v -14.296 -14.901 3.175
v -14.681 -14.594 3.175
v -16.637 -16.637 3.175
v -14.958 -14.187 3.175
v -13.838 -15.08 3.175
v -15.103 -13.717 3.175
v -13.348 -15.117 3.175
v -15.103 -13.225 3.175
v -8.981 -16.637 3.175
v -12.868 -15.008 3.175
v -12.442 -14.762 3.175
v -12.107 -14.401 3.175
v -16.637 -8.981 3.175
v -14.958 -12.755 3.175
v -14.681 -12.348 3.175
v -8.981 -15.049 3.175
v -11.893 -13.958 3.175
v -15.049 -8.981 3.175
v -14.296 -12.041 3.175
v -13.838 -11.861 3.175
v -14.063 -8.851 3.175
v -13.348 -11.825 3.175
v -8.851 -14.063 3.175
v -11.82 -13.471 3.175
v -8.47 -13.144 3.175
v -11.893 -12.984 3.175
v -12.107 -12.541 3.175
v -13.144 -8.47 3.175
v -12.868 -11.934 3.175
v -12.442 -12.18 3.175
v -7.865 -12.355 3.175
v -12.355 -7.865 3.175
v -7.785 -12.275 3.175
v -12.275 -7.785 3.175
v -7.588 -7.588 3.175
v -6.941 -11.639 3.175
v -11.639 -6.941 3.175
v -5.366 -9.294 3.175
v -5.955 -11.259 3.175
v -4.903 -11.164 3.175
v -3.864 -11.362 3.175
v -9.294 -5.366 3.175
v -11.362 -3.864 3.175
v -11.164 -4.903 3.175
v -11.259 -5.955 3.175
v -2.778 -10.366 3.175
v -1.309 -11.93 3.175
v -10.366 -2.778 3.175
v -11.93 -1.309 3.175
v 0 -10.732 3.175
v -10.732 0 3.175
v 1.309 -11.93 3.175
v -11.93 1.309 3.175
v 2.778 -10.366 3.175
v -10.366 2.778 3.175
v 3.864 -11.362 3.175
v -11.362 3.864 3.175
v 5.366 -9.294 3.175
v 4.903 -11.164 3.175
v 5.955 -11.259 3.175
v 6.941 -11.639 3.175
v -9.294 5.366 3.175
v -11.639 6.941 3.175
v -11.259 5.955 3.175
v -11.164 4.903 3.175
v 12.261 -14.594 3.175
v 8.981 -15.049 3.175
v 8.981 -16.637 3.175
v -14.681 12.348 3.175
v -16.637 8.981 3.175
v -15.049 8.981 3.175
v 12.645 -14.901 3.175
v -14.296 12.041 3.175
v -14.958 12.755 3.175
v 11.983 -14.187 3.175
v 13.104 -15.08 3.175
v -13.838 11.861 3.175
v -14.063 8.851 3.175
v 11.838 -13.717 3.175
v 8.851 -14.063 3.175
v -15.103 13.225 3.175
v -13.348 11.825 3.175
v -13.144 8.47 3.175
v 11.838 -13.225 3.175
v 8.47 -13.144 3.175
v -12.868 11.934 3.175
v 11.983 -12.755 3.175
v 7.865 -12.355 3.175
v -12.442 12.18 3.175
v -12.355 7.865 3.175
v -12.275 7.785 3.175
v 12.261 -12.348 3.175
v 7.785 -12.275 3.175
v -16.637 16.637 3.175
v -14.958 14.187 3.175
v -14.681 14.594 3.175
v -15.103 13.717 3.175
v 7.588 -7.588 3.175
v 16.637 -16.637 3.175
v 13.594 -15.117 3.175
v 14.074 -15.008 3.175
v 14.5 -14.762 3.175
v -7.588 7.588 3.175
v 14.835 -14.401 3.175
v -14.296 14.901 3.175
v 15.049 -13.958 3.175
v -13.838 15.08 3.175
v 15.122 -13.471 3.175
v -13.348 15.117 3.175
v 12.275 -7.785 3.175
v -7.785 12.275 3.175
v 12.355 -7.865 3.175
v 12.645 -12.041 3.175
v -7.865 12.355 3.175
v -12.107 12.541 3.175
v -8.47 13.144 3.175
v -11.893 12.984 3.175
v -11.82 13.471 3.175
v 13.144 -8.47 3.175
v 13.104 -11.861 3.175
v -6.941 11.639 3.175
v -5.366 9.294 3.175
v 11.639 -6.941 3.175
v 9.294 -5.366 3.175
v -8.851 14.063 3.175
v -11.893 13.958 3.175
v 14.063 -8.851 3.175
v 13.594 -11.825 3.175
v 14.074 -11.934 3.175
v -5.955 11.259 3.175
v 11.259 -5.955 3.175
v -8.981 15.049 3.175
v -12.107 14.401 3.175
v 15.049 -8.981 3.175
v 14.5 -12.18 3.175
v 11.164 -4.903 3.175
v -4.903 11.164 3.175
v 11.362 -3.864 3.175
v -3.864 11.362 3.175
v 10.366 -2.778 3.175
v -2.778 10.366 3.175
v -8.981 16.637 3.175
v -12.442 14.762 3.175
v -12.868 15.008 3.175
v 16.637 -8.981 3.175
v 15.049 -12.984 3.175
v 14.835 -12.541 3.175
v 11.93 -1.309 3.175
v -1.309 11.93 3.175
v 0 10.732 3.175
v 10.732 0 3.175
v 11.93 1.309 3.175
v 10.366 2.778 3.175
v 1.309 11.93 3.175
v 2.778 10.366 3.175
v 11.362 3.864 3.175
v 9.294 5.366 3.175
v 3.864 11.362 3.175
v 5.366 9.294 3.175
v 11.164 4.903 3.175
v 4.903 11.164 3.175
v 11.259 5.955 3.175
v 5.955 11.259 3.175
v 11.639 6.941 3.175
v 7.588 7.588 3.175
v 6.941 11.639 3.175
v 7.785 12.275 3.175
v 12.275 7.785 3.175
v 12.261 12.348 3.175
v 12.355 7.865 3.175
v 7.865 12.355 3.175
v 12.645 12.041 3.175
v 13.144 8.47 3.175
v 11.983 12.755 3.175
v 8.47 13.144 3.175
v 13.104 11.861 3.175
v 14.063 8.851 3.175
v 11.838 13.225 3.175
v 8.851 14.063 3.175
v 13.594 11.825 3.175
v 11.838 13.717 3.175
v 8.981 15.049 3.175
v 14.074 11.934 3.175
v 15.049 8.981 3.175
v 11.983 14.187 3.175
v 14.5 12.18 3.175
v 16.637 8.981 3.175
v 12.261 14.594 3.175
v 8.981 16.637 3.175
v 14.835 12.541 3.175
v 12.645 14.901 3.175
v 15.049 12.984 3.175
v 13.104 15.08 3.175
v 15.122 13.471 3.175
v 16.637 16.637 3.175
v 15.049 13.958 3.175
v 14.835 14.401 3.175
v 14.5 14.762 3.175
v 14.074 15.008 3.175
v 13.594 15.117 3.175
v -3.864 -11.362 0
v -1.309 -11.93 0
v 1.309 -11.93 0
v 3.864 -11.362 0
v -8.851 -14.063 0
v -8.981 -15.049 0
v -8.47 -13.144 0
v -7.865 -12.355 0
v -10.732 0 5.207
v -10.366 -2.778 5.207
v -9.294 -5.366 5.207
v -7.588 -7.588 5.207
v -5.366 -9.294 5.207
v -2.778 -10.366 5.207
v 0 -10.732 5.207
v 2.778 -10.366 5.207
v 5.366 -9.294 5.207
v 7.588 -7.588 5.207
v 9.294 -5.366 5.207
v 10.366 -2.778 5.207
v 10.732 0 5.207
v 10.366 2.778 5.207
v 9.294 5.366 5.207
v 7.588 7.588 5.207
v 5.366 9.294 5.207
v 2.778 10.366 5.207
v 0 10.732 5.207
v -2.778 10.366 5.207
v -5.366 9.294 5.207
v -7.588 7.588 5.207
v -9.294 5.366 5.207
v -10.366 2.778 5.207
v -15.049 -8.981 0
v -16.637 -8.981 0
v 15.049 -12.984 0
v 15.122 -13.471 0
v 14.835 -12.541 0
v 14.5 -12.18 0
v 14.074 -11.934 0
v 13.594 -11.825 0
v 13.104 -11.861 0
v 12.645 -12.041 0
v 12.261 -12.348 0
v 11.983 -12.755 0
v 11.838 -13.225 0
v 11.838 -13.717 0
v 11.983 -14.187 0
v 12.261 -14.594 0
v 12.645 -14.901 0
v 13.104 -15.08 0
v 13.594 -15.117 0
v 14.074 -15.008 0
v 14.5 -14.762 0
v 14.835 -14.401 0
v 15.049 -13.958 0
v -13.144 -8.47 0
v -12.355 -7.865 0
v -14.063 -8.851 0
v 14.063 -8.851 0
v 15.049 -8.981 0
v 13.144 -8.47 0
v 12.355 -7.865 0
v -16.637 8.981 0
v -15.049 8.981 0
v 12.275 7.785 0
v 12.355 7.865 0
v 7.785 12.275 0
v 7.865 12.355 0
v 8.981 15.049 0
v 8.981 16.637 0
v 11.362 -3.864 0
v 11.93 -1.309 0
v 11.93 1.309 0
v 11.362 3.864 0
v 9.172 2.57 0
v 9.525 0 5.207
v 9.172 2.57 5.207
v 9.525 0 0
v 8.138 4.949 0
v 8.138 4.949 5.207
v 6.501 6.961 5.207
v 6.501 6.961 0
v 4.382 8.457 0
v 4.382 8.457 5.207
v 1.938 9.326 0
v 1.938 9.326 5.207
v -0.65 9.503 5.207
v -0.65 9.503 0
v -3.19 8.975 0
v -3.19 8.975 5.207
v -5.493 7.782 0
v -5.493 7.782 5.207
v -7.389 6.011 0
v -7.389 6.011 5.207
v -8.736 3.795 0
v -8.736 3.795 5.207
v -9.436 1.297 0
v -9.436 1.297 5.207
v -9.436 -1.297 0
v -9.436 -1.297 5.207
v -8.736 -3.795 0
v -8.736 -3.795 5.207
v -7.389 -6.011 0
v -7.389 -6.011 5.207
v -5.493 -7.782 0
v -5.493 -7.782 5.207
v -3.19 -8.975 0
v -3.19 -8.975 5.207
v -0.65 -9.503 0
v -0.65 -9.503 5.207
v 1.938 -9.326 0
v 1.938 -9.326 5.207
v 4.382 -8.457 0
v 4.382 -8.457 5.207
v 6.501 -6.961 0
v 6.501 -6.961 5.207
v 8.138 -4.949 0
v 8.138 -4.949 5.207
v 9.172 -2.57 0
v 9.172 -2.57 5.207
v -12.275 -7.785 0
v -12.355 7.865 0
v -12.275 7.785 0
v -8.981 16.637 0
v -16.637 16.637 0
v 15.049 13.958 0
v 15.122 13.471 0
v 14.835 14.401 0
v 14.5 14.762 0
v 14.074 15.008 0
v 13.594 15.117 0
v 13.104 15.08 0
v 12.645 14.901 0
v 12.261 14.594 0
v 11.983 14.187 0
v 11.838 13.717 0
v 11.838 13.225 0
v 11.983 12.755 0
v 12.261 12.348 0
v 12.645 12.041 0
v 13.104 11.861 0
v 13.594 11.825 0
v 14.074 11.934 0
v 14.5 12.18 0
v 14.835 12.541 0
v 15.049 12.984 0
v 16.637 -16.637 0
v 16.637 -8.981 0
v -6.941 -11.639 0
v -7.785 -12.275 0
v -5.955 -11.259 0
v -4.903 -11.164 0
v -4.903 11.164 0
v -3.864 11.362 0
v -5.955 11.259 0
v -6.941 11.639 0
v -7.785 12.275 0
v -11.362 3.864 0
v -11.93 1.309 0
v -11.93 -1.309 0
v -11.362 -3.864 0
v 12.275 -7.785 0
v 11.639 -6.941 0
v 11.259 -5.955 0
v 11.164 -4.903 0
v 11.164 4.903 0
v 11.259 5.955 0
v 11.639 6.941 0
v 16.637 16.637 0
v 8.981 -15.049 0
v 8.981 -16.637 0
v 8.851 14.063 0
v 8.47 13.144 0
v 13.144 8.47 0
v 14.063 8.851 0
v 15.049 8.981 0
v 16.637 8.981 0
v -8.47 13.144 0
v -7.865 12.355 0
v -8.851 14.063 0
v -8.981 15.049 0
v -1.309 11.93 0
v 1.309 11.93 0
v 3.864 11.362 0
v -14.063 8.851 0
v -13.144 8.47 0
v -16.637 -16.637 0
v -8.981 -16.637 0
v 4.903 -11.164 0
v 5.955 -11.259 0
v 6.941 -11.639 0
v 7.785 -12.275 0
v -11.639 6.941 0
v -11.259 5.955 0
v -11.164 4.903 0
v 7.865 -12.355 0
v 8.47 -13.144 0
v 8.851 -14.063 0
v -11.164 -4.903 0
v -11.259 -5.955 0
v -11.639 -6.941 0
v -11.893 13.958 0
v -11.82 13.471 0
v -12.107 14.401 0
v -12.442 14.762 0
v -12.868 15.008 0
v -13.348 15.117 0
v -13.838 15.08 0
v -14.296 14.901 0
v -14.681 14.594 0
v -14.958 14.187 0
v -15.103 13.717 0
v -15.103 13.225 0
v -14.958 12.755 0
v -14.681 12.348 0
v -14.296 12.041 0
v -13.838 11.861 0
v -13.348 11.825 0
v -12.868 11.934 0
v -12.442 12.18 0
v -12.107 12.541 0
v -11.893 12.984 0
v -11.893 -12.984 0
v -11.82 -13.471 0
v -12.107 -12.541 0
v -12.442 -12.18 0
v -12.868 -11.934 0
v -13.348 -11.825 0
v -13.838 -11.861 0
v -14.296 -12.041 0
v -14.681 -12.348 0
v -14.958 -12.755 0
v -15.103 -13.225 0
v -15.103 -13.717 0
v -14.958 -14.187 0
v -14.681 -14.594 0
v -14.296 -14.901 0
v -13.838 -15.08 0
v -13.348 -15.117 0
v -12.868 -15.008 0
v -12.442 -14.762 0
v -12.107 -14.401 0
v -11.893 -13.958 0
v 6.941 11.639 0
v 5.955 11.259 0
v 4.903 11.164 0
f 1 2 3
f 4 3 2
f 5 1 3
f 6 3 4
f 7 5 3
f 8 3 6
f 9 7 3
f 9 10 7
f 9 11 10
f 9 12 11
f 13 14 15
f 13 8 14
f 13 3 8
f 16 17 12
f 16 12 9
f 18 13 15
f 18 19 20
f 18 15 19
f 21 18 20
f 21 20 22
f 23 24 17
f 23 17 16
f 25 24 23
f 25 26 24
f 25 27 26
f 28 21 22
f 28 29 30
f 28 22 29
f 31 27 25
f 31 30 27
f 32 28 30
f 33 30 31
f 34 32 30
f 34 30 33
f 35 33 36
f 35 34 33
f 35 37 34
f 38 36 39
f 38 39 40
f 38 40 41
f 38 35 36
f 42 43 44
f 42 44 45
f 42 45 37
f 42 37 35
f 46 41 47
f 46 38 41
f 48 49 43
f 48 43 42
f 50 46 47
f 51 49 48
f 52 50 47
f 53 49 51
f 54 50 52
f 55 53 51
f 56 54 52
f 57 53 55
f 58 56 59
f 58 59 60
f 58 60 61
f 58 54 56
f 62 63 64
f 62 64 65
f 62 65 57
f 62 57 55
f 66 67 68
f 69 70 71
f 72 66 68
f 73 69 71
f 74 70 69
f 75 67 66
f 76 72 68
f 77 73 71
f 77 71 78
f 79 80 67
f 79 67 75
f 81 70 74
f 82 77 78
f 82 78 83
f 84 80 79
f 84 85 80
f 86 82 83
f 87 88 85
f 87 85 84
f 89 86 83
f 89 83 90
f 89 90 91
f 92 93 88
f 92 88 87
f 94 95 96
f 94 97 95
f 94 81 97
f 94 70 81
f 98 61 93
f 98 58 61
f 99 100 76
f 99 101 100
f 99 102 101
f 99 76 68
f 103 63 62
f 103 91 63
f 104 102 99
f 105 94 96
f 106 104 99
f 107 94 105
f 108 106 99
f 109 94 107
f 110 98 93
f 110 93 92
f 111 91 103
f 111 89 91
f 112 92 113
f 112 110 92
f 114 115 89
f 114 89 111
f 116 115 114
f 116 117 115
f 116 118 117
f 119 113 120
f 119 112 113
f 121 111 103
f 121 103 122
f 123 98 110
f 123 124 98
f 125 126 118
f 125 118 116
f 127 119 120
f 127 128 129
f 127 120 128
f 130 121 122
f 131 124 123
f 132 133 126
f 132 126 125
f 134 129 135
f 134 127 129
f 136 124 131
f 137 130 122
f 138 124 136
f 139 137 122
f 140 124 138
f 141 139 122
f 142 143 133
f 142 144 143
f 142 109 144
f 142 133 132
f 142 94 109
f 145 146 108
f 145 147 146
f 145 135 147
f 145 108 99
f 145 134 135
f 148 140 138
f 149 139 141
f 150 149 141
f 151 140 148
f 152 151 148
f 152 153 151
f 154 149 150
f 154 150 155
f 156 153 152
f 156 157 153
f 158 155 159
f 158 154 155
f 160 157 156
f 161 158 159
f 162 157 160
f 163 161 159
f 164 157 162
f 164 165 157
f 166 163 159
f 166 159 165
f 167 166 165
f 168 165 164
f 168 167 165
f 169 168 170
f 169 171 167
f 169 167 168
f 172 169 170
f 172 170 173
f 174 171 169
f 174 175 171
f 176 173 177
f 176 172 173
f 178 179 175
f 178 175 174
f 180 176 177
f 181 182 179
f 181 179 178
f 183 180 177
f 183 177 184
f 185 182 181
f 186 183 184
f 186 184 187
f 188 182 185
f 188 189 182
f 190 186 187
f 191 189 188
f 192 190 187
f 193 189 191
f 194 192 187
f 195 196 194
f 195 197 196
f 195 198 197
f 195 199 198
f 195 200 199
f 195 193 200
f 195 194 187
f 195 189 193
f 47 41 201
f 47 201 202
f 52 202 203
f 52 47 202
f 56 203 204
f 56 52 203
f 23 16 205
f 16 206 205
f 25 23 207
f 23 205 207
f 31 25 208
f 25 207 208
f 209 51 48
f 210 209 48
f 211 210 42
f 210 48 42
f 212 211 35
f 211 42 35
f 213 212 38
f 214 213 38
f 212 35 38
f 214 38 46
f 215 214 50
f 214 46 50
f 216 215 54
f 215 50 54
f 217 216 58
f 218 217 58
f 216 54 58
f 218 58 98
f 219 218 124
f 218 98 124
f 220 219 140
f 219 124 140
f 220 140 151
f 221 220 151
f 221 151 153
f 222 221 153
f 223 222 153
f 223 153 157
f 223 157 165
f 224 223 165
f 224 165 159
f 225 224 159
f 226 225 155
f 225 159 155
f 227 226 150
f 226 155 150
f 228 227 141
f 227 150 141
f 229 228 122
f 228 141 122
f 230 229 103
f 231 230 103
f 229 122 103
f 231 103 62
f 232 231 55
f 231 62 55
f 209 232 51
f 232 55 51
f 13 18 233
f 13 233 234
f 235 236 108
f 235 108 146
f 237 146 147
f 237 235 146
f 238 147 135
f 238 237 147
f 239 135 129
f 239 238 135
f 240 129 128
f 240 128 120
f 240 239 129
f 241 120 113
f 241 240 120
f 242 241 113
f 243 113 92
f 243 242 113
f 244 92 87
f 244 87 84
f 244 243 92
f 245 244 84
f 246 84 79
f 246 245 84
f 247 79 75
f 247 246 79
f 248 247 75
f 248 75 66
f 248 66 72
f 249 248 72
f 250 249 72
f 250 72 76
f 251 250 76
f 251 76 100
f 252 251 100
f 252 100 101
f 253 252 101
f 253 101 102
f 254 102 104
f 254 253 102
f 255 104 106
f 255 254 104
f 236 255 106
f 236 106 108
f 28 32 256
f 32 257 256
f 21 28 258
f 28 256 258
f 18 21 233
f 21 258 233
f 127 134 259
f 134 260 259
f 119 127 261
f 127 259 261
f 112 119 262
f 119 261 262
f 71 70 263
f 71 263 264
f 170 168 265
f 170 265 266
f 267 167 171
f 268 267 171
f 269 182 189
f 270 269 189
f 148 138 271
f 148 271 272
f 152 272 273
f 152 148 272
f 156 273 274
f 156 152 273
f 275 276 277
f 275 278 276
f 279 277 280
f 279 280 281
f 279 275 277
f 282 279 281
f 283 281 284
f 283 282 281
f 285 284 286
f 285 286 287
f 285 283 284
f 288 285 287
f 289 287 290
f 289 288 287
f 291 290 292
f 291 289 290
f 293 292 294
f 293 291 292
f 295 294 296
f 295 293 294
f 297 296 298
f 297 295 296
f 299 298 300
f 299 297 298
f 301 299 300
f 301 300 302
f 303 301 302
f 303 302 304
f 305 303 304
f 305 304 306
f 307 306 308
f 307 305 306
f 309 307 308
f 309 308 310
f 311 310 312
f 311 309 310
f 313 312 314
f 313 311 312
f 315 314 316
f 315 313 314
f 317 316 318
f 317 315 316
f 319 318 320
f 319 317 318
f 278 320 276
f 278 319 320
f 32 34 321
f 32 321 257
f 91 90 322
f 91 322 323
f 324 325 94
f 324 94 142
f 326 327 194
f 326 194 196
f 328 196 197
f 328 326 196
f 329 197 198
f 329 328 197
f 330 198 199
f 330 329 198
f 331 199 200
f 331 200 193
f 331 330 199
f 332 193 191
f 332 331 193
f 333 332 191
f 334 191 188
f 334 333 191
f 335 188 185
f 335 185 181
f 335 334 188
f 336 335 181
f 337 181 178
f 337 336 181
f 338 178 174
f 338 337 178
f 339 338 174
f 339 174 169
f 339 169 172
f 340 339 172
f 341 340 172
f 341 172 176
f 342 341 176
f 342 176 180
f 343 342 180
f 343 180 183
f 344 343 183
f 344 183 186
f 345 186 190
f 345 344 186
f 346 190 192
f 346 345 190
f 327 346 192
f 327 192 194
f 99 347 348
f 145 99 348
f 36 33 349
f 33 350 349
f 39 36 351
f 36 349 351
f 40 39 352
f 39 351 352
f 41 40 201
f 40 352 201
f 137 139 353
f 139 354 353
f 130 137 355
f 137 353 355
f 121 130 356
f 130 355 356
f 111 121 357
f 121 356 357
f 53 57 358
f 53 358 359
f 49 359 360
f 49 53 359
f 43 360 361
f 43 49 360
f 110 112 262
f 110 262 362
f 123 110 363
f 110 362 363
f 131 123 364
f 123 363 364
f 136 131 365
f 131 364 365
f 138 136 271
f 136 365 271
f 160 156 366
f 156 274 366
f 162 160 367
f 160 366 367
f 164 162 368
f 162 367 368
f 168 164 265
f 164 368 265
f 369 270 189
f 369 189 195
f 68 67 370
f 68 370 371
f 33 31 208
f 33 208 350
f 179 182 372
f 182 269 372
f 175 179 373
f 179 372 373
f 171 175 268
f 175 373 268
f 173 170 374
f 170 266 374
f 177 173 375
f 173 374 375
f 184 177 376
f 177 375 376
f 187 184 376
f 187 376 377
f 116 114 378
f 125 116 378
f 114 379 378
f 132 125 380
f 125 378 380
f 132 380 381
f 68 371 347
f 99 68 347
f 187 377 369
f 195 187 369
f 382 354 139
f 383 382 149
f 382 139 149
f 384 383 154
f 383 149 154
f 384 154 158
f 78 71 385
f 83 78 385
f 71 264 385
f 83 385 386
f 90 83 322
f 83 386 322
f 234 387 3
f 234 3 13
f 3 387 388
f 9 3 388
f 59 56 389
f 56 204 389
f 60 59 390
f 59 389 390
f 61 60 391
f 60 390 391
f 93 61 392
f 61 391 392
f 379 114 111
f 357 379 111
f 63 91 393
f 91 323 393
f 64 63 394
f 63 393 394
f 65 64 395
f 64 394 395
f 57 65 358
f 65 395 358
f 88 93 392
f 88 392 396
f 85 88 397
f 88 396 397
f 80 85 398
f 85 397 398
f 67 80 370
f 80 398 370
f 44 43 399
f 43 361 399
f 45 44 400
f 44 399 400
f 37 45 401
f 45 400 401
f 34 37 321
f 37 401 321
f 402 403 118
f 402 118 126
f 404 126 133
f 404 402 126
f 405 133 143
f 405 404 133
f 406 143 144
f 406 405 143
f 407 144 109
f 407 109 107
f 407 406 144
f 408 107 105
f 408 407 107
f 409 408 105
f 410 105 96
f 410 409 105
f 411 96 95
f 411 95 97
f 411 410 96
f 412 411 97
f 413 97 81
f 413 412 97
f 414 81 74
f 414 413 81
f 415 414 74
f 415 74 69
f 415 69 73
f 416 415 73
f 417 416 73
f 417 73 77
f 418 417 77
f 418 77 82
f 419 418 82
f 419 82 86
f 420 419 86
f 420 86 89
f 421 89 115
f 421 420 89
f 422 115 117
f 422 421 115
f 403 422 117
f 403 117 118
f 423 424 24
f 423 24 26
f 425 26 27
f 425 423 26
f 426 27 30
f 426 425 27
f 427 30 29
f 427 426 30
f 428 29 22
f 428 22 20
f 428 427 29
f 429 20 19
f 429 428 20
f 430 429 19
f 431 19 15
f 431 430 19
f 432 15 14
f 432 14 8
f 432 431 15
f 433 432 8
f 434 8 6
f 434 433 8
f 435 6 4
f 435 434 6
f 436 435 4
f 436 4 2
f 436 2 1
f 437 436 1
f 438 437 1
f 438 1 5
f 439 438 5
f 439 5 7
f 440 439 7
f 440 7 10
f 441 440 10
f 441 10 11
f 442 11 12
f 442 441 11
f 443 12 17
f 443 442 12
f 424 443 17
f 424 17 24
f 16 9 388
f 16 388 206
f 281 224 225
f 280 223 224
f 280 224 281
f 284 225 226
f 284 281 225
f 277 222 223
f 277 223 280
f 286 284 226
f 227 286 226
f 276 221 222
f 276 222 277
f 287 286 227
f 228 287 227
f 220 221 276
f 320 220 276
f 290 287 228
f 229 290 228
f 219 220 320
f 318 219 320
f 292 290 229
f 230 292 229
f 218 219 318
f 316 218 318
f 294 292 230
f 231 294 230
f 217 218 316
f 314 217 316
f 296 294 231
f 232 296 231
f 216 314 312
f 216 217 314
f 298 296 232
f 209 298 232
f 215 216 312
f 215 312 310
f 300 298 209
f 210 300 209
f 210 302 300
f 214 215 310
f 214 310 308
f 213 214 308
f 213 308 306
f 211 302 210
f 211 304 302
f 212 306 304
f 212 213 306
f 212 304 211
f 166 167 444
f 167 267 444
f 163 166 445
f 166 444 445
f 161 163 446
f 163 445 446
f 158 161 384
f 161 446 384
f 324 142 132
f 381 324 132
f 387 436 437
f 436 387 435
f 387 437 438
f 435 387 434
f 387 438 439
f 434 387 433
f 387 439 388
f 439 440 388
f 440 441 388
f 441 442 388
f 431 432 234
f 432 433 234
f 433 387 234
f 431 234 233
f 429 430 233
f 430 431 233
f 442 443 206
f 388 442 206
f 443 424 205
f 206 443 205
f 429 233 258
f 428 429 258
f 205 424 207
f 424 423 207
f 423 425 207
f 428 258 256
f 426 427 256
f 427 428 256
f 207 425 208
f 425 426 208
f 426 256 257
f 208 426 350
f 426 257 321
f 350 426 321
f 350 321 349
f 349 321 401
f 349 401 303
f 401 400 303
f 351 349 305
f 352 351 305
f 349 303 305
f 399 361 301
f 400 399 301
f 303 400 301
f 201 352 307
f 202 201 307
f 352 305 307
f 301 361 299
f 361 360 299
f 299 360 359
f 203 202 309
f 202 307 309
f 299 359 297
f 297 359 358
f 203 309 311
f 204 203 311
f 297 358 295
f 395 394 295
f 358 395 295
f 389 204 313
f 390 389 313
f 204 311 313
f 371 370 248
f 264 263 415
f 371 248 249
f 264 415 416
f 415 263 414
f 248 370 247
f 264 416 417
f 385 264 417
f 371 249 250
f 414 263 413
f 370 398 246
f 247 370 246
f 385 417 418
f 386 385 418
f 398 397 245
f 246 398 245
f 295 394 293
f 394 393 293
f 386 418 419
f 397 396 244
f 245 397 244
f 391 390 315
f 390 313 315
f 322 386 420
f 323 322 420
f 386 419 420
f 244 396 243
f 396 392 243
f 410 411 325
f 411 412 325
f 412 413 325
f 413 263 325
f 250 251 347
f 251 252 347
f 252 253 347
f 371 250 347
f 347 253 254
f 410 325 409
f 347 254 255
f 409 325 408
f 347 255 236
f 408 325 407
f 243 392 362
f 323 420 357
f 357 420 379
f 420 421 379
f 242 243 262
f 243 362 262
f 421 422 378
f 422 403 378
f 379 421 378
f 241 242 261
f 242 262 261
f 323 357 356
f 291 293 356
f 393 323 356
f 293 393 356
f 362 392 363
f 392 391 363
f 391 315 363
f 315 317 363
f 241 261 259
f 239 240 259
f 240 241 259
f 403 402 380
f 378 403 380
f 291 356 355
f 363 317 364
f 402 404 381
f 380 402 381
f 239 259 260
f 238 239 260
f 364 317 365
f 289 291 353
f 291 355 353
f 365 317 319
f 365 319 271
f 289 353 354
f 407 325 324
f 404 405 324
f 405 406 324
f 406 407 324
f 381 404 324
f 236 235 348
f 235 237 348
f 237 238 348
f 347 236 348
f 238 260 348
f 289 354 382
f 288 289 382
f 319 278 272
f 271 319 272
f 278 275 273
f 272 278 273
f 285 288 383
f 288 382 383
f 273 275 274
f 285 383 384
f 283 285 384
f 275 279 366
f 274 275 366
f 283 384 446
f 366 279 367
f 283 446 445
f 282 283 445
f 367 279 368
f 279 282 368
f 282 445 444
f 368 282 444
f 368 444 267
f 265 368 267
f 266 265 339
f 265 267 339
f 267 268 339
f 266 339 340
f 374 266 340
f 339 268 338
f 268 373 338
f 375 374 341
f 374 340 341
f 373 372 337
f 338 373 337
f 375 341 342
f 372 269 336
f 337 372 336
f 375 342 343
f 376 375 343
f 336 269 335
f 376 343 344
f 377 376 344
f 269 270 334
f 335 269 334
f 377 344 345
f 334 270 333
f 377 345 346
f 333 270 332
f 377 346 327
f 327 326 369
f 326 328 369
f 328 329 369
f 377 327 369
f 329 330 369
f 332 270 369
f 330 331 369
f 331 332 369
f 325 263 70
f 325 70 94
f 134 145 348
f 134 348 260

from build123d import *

# Parameters (mm, degrees)
SKETCH3_W           = 33.274
SKETCH3_H           = 33.274
SKETCH3_R           = 9.525
SKETCH3_R_2         = 1.651
BOSS_EXTRUDE1_DEPTH = 3.175
CUT_EXTRUDE1_DEPTH  = 24.741528236
SKETCH5_R           = 10.7315
SKETCH5_R_2         = 9.525
BOSS_EXTRUDE2_DEPTH = 2.032
FILLET1_R           = 3.81


with BuildPart() as part:
    # Sketch3 → Boss-Extrude1 (new body)
    with BuildSketch(Plane.XY):
        Rectangle(SKETCH3_W, SKETCH3_H)
        Circle(SKETCH3_R, mode=Mode.SUBTRACT)
        with Locations((-13.47089, 13.47089)):
            Circle(SKETCH3_R_2, mode=Mode.SUBTRACT)
        with Locations((-13.47089, -13.47089)):
            Circle(SKETCH3_R_2, mode=Mode.SUBTRACT)
        with Locations((13.47089, 13.47089)):
            Circle(SKETCH3_R_2, mode=Mode.SUBTRACT)
        with Locations((13.47089, -13.47089)):
            Circle(SKETCH3_R_2, mode=Mode.SUBTRACT)
    extrude(amount=BOSS_EXTRUDE1_DEPTH)

    # Sketch4 → Cut-Extrude1 (cut, through all)
    with BuildSketch(Plane.XY.offset(3.175)):
        with BuildLine():
            Line((-8.980761939, 16.637), (-8.980761939, 13.47089))
            Line((-8.980761939, 13.47089), (-5.938925744, 10.429053805))
            ThreePointArc((-5.938925744, 10.429053805), (0, 12.0015), (5.938925744, 10.429053805))
            Line((5.938925744, 10.429053805), (8.980761939, 13.47089))
            Line((8.980761939, 13.47089), (8.980761939, 16.637))
            Line((8.980761939, 16.637), (-8.980761939, 16.637))
        make_face()
        with BuildLine():
            Line((-16.637, 8.980761939), (-13.47089, 8.980761939))
            Line((-13.47089, 8.980761939), (-10.429053805, 5.938925744))
            ThreePointArc((-10.429053805, 5.938925744), (-12.0015, 0), (-10.429053805, -5.938925744))
            Line((-10.429053805, -5.938925744), (-13.47089, -8.980761939))
            Line((-13.47089, -8.980761939), (-16.637, -8.980761939))
            Line((-16.637, -8.980761939), (-16.637, 8.980761939))
        make_face()
        with BuildLine():
            Line((-8.980761939, -16.637), (-8.980761939, -13.47089))
            Line((-8.980761939, -13.47089), (-5.938925744, -10.429053805))
            ThreePointArc((-5.938925744, -10.429053805), (0, -12.0015), (5.938925744, -10.429053805))
            Line((5.938925744, -10.429053805), (8.980761939, -13.47089))
            Line((8.980761939, -13.47089), (8.980761939, -16.637))
            Line((8.980761939, -16.637), (-8.980761939, -16.637))
        make_face()
        with BuildLine():
            Line((16.637, -8.980761939), (13.47089, -8.980761939))
            Line((13.47089, -8.980761939), (10.429053805, -5.938925744))
            ThreePointArc((10.429053805, -5.938925744), (12.0015, 0), (10.429053805, 5.938925744))
            Line((10.429053805, 5.938925744), (13.47089, 8.980761939))
            Line((13.47089, 8.980761939), (16.637, 8.980761939))
            Line((16.637, 8.980761939), (16.637, -8.980761939))
        make_face()
    extrude(amount=-CUT_EXTRUDE1_DEPTH, mode=Mode.SUBTRACT)

    # Sketch5 → Boss-Extrude2 (add)
    with BuildSketch(Plane.XY.offset(3.175)):
        with Locations(Location((0, 0, 0), (0, 0, 180))):
            Circle(SKETCH5_R)
        Circle(SKETCH5_R_2, mode=Mode.SUBTRACT)
    extrude(amount=BOSS_EXTRUDE2_DEPTH)

    # Fillet1
    fillet1_edges = [part.edges().sort_by_distance(p)[0] for p in [
        (8.980761939, 13.47089, 1.5875),
        (5.938925744, 10.429053805, 1.5875),
        (-5.938925744, 10.429053805, 1.5875),
        (-8.980761939, 13.47089, 1.5875),
        (-13.47089, 8.980761939, 1.5875),
        (-10.429053805, 5.938925744, 1.5875),
        (-10.429053805, -5.938925744, 1.5875),
        (-13.47089, -8.980761939, 1.5875),
        (-8.980761939, -13.47089, 1.5875),
        (-5.938925744, -10.429053805, 1.5875),
        (5.938925744, -10.429053805, 1.5875),
        (8.980761939, -13.47089, 1.5875),
        (13.47089, -8.980761939, 1.5875),
        (10.429053805, -5.938925744, 1.5875),
        (10.429053805, 5.938925744, 1.5875),
        (13.47089, 8.980761939, 1.5875),
    ]]
    fillet(fillet1_edges, radius=FILLET1_R)


solid = part.part
